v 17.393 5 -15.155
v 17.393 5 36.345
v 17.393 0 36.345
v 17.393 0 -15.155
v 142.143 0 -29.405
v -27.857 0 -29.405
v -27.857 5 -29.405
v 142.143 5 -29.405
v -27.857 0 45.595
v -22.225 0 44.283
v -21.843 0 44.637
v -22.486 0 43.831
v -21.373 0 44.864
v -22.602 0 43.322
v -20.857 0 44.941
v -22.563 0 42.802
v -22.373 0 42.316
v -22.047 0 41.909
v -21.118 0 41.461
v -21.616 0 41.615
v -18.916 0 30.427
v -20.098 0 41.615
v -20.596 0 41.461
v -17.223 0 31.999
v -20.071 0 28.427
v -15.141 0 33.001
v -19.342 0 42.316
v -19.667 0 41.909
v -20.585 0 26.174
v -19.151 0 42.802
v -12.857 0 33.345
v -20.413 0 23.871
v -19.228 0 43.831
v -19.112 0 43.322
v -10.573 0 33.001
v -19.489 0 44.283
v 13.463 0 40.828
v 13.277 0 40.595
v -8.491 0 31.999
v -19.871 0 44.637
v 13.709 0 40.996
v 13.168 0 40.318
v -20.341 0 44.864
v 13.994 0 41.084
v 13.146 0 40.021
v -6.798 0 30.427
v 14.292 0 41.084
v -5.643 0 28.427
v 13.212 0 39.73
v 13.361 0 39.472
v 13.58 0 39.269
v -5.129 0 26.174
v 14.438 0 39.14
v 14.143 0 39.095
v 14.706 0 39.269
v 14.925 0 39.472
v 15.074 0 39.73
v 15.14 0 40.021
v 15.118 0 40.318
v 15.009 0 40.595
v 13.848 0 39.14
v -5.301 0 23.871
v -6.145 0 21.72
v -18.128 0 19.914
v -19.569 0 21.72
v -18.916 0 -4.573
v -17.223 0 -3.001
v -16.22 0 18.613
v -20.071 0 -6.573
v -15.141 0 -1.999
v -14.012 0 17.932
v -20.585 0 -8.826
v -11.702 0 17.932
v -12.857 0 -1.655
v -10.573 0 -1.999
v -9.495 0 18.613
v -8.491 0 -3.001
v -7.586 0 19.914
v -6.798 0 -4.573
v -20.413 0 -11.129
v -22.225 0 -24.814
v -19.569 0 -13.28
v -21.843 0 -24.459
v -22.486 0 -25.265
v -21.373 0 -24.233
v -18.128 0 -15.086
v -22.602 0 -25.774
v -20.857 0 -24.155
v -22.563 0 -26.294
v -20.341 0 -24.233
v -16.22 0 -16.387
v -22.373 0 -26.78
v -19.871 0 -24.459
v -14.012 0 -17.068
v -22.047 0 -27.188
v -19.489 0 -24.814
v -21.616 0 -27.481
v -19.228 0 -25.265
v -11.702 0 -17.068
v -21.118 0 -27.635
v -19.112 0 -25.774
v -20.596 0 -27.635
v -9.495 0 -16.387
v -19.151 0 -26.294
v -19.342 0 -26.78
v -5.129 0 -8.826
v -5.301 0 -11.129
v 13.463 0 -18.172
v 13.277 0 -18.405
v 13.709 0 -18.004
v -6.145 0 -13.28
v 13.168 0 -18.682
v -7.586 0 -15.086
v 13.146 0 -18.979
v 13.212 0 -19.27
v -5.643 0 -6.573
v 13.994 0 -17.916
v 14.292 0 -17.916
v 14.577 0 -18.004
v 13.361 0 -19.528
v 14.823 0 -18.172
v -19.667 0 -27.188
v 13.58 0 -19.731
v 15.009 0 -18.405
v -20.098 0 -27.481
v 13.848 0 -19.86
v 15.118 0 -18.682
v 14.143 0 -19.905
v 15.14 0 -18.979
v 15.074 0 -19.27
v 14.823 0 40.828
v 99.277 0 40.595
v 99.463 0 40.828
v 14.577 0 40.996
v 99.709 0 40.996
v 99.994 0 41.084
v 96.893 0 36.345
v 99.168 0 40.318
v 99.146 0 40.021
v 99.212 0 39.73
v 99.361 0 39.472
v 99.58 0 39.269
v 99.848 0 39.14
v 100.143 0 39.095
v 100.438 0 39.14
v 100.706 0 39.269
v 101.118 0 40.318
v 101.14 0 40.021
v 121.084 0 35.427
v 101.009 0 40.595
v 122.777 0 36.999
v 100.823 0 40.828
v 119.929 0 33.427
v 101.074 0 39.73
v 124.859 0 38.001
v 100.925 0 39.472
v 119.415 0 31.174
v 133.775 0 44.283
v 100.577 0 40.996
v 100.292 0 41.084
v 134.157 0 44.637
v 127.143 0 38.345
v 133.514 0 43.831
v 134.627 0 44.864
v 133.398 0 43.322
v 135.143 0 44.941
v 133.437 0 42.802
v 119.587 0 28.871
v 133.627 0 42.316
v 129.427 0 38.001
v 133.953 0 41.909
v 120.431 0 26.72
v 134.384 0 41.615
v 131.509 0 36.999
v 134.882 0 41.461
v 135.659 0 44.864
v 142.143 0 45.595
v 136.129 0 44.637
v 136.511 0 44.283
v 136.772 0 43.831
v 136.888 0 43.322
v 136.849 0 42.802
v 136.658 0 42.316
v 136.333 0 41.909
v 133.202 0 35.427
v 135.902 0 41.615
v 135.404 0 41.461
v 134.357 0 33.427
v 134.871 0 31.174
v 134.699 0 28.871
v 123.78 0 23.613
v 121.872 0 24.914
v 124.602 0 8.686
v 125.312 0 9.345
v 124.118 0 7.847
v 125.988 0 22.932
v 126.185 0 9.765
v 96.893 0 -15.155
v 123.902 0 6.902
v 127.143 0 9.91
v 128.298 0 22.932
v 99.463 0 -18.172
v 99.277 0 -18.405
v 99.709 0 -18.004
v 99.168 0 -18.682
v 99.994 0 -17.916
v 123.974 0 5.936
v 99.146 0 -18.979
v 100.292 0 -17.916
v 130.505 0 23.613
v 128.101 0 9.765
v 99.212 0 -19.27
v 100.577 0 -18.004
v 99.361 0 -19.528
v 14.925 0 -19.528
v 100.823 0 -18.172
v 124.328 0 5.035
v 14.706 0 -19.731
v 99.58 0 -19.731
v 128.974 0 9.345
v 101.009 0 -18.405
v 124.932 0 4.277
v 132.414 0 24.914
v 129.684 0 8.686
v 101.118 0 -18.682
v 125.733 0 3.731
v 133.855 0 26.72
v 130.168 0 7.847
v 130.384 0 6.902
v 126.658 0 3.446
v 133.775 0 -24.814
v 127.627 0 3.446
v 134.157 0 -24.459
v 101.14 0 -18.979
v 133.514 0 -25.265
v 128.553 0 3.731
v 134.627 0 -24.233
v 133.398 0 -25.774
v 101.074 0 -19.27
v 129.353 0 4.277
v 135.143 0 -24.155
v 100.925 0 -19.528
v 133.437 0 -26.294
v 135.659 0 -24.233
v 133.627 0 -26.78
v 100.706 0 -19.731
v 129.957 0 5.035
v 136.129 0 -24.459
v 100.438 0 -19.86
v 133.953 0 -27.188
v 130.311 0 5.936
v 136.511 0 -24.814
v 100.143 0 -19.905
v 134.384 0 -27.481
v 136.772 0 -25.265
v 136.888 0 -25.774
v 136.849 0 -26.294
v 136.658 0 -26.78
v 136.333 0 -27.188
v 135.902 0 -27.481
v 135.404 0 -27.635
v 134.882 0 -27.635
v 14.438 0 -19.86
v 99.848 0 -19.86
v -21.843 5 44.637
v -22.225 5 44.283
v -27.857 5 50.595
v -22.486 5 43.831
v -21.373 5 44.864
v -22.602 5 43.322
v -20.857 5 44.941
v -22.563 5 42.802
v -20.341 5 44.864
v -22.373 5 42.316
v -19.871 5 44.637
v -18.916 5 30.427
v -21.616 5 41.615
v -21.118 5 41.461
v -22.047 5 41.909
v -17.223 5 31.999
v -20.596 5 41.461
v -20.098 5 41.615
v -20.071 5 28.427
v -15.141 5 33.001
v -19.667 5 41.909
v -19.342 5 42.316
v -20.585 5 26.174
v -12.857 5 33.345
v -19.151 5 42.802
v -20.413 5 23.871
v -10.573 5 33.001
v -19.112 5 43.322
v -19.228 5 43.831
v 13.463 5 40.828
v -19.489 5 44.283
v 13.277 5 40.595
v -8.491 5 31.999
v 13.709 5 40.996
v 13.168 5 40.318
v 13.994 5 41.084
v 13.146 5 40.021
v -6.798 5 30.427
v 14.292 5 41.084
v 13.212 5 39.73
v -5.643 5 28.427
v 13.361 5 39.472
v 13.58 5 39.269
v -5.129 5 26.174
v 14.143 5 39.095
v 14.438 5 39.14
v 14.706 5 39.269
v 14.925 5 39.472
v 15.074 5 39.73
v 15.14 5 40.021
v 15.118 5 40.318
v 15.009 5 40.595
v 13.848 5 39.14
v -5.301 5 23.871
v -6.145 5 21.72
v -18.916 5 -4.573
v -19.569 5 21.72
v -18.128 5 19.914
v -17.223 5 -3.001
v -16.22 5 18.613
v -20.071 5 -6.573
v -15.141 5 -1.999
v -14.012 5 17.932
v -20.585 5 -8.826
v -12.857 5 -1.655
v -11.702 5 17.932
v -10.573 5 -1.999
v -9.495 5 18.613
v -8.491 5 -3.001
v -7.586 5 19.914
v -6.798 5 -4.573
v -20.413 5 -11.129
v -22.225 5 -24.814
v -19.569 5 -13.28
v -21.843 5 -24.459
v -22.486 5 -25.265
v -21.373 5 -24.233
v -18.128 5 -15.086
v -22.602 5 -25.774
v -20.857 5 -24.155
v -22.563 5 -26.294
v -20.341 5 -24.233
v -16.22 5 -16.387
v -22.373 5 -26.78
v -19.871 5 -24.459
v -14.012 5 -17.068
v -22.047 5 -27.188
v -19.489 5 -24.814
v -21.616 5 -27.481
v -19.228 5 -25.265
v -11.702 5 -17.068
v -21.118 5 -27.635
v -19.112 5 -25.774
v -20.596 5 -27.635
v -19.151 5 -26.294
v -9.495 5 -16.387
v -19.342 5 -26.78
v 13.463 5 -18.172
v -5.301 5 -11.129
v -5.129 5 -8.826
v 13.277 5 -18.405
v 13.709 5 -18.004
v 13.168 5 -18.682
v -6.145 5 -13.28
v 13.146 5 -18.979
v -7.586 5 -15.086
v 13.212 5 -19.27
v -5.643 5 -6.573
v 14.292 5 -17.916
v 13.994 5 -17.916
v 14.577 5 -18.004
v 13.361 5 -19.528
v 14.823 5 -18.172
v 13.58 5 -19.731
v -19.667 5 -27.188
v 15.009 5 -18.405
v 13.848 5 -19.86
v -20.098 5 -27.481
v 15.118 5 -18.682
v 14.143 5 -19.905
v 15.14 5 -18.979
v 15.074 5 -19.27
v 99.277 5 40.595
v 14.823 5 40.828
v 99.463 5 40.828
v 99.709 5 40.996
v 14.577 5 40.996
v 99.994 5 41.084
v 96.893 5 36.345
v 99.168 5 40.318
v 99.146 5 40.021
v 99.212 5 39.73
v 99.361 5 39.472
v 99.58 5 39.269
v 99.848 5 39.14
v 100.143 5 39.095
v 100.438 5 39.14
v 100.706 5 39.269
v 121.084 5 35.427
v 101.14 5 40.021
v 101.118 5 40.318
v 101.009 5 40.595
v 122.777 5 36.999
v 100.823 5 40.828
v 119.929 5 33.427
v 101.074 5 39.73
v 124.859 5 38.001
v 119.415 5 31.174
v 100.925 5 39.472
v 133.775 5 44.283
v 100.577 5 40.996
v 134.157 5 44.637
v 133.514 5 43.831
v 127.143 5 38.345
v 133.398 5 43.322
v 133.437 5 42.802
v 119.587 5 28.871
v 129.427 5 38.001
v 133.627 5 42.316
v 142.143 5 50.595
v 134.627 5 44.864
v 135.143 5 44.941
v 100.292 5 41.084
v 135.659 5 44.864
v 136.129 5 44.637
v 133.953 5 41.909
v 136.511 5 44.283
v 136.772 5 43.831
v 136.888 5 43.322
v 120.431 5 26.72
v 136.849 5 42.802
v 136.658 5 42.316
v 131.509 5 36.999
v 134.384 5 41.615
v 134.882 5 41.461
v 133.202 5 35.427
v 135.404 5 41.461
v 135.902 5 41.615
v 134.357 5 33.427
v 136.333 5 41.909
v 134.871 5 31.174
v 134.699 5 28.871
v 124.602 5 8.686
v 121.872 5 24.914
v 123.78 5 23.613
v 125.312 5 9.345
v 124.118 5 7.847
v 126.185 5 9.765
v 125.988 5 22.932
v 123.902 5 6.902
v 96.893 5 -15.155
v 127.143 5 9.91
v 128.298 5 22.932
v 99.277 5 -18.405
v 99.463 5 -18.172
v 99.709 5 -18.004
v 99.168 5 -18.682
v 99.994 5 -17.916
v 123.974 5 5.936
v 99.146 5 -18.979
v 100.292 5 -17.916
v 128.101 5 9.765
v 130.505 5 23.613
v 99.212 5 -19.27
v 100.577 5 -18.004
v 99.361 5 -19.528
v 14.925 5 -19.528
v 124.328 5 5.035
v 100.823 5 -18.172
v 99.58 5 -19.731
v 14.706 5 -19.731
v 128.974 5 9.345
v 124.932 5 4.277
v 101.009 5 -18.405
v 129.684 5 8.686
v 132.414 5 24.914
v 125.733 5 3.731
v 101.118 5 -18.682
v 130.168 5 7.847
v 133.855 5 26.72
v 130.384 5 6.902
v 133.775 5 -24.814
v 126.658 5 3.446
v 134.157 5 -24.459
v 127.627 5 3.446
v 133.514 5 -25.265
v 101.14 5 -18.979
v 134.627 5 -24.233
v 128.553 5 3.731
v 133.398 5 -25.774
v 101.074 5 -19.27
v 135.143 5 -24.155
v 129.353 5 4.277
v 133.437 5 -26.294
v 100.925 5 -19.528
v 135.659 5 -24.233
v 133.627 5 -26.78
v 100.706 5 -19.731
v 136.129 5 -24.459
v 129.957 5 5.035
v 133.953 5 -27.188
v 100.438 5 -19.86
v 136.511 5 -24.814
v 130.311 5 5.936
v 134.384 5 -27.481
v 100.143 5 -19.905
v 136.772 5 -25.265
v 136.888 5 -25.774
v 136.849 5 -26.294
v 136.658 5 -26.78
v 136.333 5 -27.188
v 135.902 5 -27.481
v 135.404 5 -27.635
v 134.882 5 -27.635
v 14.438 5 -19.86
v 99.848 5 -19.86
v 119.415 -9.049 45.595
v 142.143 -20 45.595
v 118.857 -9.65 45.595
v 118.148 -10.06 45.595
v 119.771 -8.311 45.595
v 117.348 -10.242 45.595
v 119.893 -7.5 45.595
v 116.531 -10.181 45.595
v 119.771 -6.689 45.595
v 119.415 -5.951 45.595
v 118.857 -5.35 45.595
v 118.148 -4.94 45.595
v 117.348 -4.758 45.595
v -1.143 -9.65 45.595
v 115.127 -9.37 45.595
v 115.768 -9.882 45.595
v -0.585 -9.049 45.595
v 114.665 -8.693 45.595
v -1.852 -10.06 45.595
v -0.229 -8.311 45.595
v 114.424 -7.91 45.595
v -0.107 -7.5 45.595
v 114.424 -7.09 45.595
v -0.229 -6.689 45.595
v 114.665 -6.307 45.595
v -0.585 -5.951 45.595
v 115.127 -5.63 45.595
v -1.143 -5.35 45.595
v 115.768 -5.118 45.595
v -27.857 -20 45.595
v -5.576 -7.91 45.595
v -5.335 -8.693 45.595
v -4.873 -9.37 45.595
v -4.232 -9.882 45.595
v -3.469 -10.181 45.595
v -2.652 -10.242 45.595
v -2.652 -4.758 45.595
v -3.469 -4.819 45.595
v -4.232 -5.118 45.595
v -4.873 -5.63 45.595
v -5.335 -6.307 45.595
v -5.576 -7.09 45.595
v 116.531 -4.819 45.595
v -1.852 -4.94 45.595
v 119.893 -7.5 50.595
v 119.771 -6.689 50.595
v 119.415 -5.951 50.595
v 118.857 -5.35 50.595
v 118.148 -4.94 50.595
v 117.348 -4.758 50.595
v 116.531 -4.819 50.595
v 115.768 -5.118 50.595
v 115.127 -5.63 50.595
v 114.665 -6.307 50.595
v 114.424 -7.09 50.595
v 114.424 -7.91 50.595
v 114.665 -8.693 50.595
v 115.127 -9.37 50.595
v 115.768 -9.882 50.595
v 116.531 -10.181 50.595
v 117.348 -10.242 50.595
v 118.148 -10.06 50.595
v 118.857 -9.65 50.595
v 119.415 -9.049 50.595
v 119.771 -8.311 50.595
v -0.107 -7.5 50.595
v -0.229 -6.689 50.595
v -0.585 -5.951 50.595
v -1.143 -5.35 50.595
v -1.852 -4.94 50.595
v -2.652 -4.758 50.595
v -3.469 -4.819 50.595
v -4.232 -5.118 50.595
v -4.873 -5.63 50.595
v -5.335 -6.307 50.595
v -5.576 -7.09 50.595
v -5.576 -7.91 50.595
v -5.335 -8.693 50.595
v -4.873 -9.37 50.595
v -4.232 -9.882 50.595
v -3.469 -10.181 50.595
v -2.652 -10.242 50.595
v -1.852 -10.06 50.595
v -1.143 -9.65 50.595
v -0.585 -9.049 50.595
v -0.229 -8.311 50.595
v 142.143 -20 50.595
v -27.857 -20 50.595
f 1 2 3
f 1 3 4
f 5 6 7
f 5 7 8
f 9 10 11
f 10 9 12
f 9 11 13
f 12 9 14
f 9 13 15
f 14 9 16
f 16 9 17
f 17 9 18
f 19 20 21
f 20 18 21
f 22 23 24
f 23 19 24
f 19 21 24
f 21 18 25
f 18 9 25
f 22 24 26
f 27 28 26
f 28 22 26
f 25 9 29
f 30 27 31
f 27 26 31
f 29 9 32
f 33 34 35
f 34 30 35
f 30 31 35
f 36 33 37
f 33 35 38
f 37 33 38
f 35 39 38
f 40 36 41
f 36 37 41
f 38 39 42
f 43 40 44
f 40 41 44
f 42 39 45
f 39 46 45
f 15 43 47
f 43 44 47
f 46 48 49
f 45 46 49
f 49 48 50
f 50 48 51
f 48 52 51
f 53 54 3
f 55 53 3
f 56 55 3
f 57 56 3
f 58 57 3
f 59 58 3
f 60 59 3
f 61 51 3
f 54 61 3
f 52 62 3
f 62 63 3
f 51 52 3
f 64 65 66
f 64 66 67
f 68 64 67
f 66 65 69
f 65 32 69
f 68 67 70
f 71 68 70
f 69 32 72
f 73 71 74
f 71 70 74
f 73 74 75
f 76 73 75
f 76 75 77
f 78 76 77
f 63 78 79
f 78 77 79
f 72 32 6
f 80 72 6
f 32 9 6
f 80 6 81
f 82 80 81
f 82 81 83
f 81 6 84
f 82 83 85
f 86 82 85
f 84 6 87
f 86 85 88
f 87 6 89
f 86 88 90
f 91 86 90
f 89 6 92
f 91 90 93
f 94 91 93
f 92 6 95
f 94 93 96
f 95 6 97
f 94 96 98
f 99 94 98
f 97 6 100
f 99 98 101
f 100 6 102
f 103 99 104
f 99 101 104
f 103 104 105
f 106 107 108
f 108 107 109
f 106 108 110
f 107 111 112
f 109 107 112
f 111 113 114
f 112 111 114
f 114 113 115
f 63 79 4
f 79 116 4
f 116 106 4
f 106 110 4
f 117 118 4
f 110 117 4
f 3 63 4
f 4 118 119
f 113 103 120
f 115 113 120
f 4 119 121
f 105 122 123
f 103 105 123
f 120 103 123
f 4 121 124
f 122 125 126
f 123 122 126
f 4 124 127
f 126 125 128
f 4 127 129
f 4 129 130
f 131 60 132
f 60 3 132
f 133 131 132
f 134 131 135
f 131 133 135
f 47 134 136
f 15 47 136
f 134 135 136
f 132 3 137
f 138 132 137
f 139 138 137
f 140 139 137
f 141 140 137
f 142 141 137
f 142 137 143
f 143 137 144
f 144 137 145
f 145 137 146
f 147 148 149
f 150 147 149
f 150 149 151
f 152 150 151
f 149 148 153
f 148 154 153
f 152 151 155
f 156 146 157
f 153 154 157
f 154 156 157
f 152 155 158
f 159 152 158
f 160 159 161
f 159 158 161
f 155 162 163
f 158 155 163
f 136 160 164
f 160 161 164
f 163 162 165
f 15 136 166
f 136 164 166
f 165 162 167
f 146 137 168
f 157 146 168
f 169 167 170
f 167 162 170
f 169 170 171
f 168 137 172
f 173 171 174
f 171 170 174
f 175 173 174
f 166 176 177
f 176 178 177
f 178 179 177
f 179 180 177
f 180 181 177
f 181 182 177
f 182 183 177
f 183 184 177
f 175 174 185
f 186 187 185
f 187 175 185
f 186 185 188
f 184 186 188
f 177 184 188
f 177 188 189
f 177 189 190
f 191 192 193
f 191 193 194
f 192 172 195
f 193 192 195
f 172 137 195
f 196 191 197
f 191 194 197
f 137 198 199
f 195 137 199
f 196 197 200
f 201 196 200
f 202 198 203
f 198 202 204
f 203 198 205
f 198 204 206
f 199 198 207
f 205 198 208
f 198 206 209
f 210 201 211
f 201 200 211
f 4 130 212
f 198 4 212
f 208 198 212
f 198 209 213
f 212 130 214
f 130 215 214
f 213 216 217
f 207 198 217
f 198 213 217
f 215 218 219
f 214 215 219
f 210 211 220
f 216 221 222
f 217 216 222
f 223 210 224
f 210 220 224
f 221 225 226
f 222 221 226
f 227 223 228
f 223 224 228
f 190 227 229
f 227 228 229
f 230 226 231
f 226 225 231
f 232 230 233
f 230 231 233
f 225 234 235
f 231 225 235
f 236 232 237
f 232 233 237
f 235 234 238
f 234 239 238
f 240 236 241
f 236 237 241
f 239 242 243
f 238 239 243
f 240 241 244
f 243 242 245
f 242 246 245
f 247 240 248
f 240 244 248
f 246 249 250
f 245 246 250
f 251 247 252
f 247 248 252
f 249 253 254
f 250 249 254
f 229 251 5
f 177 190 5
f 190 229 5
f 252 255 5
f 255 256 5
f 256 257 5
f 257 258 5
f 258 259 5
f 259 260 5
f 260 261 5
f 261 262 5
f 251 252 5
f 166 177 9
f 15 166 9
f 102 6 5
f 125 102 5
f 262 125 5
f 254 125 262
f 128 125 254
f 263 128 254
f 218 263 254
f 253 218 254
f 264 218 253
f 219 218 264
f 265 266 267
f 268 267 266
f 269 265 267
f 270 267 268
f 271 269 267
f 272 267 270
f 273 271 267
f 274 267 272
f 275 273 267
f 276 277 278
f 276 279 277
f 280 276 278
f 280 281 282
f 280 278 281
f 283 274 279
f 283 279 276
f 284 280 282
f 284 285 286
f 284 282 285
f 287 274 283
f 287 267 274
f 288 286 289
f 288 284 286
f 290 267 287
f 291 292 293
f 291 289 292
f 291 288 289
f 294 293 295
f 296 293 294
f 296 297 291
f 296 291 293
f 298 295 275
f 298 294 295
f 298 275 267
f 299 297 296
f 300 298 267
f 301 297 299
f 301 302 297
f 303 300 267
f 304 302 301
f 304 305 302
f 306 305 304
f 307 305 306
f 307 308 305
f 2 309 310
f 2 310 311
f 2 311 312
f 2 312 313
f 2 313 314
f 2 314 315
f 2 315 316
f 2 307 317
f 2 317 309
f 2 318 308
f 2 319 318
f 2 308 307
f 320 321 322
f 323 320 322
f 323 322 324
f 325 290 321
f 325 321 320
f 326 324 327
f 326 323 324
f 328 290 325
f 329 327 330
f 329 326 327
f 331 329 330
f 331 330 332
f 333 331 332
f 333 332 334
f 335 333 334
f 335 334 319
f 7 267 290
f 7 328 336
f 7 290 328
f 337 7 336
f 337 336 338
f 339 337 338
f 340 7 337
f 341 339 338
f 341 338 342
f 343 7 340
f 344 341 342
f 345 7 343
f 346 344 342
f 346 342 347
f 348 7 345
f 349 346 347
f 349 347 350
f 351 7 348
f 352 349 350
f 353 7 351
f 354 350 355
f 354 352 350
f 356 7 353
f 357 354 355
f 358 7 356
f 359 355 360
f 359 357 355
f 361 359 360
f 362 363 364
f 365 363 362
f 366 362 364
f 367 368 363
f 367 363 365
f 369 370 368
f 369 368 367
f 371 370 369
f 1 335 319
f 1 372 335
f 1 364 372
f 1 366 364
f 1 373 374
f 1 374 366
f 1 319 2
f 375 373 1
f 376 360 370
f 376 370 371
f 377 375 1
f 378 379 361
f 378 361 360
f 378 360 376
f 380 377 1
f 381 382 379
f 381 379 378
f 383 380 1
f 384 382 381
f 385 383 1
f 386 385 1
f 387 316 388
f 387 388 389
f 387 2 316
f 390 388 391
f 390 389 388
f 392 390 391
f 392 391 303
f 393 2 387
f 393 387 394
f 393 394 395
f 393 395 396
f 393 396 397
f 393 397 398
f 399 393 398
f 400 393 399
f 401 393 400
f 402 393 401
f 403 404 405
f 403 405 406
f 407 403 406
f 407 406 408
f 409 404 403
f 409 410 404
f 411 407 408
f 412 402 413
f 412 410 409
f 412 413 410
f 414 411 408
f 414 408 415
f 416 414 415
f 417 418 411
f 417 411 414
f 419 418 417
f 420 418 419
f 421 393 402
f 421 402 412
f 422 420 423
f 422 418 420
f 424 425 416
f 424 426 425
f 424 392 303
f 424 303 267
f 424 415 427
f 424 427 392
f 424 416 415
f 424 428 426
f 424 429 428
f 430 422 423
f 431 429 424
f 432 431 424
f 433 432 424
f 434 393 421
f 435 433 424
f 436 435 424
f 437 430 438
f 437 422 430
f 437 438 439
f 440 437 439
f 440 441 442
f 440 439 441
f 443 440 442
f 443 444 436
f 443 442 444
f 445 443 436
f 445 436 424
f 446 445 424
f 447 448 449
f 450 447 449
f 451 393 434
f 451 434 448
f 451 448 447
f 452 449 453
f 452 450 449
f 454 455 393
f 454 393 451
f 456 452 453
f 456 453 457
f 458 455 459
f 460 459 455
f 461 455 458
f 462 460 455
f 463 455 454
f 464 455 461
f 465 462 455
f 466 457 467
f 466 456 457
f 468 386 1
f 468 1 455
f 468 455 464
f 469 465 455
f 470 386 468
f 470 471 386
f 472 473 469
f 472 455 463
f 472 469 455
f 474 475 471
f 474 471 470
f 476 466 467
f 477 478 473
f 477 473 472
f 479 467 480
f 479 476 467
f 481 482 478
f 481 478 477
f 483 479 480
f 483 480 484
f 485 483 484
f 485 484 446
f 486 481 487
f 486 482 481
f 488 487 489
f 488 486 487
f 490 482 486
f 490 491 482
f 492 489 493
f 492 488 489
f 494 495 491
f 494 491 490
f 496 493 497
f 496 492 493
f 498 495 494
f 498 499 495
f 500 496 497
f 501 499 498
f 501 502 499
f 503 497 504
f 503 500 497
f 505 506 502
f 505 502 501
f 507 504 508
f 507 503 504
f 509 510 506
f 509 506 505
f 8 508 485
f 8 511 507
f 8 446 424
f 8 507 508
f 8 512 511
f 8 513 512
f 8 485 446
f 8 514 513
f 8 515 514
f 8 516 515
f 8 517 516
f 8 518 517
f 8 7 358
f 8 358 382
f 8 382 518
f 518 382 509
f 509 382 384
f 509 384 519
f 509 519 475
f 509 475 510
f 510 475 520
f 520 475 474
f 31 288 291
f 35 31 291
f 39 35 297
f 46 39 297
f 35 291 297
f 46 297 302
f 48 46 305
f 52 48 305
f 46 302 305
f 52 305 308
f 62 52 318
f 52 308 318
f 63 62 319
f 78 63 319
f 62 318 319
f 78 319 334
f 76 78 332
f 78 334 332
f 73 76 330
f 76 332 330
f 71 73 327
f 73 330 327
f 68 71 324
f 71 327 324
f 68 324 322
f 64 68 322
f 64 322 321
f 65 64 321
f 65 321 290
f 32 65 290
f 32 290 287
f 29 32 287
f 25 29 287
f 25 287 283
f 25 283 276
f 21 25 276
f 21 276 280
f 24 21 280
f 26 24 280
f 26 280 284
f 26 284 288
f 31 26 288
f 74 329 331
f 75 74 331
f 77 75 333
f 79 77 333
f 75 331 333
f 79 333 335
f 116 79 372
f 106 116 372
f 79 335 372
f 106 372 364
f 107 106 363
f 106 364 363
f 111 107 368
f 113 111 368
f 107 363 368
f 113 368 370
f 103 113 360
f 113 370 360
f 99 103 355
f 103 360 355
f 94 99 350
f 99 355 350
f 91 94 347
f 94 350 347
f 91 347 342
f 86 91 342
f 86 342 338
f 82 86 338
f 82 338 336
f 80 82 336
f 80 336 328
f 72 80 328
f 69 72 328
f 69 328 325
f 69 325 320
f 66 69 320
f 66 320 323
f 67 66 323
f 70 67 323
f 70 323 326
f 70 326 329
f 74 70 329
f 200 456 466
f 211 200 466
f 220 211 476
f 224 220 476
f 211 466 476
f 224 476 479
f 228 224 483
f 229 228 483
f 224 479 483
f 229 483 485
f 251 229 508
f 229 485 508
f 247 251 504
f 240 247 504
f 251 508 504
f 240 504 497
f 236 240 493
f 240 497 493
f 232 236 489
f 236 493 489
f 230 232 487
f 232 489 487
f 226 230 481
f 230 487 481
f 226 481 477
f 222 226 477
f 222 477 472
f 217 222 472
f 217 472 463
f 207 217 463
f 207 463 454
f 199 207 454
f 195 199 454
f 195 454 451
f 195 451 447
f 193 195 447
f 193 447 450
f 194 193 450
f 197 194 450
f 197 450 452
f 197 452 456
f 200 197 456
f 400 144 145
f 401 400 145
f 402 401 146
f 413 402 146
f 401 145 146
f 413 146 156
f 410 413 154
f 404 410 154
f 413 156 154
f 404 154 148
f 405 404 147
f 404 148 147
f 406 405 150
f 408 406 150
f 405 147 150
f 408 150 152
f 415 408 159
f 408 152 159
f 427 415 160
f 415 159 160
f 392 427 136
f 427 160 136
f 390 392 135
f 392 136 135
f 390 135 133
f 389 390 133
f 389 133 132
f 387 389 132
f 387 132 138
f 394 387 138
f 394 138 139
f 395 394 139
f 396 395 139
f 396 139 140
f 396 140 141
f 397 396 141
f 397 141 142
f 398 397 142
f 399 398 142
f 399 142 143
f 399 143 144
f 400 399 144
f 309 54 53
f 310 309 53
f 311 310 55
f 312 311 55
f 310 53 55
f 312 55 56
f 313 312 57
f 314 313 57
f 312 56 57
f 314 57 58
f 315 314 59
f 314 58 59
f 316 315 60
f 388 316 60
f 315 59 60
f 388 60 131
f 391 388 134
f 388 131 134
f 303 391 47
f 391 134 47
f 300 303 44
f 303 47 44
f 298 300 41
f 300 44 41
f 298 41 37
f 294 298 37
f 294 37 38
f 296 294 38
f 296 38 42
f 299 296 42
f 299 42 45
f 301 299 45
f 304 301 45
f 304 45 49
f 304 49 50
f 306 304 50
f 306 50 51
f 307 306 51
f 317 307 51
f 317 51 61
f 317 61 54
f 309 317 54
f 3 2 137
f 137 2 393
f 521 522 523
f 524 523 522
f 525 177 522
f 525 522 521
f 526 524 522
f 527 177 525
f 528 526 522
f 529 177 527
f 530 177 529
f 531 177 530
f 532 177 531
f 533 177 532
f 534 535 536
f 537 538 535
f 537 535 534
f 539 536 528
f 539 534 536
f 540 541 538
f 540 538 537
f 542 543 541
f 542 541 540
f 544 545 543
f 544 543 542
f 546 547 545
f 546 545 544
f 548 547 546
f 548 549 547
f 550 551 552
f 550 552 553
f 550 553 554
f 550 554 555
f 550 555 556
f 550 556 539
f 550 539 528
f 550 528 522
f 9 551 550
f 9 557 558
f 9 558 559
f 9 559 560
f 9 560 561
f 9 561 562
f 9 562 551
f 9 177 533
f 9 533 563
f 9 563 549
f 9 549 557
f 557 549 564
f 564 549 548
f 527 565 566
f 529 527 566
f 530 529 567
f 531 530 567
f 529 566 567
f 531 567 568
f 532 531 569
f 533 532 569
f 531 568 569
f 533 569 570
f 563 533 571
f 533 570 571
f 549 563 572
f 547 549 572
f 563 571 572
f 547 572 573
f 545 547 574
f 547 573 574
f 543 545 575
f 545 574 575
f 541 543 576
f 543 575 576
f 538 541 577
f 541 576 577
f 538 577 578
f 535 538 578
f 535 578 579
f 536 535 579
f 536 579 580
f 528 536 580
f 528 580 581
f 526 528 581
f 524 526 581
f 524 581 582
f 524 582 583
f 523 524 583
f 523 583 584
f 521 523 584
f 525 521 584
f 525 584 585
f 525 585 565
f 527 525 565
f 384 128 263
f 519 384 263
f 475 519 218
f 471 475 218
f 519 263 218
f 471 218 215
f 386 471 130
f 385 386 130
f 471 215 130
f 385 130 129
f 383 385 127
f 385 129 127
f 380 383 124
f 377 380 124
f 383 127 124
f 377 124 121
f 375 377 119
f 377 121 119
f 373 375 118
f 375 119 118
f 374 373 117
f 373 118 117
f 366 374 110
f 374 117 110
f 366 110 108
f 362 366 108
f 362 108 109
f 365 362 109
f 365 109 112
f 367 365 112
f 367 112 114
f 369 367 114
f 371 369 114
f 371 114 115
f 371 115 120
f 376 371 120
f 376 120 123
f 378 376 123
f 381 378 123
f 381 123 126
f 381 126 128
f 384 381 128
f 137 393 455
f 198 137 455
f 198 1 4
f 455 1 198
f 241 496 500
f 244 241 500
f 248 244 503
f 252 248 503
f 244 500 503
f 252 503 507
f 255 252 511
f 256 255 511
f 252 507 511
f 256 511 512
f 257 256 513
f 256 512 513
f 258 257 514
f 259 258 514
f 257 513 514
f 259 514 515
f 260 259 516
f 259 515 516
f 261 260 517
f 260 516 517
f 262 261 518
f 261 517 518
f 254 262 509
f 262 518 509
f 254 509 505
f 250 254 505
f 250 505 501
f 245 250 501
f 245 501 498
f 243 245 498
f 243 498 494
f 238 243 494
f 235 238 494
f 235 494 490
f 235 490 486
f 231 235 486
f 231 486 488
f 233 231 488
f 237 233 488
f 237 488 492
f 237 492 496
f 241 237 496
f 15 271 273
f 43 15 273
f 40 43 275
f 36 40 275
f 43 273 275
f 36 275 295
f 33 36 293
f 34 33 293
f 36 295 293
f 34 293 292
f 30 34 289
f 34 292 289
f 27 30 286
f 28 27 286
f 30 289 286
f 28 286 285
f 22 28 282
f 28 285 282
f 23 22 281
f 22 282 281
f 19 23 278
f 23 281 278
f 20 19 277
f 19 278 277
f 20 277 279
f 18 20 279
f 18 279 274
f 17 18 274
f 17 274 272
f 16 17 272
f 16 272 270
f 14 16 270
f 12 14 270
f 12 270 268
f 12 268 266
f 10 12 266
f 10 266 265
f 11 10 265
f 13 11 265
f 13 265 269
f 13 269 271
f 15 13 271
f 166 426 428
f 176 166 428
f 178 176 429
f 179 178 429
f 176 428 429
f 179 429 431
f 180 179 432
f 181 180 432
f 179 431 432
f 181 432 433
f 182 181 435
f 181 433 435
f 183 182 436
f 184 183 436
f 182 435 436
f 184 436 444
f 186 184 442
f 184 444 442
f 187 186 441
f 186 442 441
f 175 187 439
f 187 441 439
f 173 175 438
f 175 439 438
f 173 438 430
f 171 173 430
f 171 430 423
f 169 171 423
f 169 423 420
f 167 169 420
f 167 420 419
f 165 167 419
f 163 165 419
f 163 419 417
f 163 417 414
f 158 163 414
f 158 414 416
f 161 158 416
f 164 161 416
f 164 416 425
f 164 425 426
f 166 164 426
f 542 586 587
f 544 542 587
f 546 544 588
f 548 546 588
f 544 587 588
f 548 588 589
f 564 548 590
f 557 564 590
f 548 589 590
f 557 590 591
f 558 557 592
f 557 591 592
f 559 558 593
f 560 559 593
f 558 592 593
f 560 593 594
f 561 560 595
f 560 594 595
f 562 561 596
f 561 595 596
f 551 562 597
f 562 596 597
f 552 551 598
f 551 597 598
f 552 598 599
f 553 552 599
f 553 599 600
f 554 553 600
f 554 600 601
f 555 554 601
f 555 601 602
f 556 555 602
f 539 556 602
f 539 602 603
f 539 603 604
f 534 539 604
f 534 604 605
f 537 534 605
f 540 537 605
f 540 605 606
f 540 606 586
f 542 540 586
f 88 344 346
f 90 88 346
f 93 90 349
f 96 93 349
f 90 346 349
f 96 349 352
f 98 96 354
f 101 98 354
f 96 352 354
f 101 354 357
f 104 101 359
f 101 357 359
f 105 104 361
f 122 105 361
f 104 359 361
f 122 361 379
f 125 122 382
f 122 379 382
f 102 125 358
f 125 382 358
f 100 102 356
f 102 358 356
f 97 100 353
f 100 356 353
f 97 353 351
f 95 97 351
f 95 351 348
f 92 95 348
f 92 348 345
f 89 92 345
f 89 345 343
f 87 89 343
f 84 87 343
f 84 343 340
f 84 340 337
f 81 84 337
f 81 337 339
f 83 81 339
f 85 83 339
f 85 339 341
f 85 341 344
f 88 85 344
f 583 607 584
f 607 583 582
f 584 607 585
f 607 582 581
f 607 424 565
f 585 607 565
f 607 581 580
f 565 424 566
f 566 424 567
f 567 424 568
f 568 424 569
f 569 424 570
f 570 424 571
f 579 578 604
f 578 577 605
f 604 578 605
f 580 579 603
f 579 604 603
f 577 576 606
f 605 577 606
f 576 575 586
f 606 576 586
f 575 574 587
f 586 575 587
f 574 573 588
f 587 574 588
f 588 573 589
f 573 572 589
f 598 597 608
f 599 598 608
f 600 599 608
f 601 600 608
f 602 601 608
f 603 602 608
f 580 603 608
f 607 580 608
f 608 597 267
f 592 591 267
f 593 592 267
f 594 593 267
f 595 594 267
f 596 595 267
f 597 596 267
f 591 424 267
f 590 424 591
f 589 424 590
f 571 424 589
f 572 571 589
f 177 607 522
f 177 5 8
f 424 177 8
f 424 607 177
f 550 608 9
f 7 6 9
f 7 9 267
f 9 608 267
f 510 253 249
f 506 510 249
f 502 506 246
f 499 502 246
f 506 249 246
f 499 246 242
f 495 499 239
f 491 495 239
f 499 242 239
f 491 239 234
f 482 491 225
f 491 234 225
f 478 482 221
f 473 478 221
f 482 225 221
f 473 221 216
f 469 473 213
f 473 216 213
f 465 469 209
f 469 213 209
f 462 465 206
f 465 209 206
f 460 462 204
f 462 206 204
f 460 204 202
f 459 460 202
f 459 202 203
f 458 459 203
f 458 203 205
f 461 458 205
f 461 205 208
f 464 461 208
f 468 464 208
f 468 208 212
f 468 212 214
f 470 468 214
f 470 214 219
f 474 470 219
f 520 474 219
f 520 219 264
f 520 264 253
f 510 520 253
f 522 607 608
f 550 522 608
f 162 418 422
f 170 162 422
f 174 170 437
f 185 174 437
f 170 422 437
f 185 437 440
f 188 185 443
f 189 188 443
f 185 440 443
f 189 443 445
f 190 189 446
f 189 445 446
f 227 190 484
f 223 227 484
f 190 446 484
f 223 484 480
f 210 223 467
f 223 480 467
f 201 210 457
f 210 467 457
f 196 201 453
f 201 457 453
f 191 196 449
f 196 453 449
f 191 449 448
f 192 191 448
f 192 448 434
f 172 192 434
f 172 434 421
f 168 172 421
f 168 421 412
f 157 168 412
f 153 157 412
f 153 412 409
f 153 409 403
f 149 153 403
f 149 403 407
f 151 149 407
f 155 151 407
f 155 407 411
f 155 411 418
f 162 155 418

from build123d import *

# Parameters (mm, degrees)
SKETCH_1_W          = 170
SKETCH_1_H          = 80
EXTRUDE_1_DEPTH     = 5
SKETCH_2_R          = 7.75
SKETCH_2_R_2        = 3.25
SKETCH_2_W          = 79.5
SKETCH_2_H          = 51.5
CUT_EXTRUDE_1_DEPTH = 151.961816214
SKETCH_5_W          = 170
SKETCH_5_H          = 25
EXTRUDE_3_DEPTH     = 5
SKETCH_7_R          = 2.75
CUT_EXTRUDE_4_DEPTH = 165.330739172
SKETCH_9_R          = 1
CUT_EXTRUDE_5_DEPTH = 153.19878434
SKETCH_10_R         = 1.75
CUT_EXTRUDE_6_DEPTH = 153.936163005


with BuildPart() as part:
    # 草图1 → 凸台-拉伸1 (new body)
    with BuildSketch(Plane(origin=(0, 0, 0), x_dir=(1, 0, 0), z_dir=(0, 1, 0))):
        with Locations((57.142857143, -10.595238095)):
            Rectangle(SKETCH_1_W, SKETCH_1_H)
    extrude(amount=EXTRUDE_1_DEPTH)

    # 草图2 → 切除-拉伸1 (cut, through all)
    with BuildSketch(Plane(origin=(0, 5, 0), x_dir=(1, 0, 0), z_dir=(0, 1, 0))):
        with Locations(Location((-12.857142857, 9.404761905, 0), (0, 0, 270))):
            Circle(SKETCH_2_R)
        with Locations(Location((-12.857142857, -25.595238095, 0), (0, 0, 270))):
            Circle(SKETCH_2_R)
        with Locations(Location((127.142857143, -6.659623692, 0), (0, 0, 270))):
            Circle(SKETCH_2_R_2)
        with Locations(Location((127.142857143, -30.595238095, 0), (0, 0, 270))):
            Circle(SKETCH_2_R)
        with Locations((57.142857143, -10.595238095)):
            Rectangle(SKETCH_2_W, SKETCH_2_H)
    extrude(amount=-CUT_EXTRUDE_1_DEPTH, mode=Mode.SUBTRACT)

    # 草图5 → 凸台-拉伸3 (add)
    with BuildSketch(Plane(origin=(0, 0, 50.595238095), x_dir=(-1, 0, 0), z_dir=(0, 0, -1))):
        with Locations((-57.142857143, -7.5)):
            Rectangle(SKETCH_5_W, SKETCH_5_H)
    extrude(amount=EXTRUDE_3_DEPTH)

    # 草图7 → 切除-拉伸4 (cut, through all)
    with BuildSketch(Plane.XY.offset(50.595238095)):
        with Locations((-2.857142857, -7.5)):
            Circle(SKETCH_7_R)
        with Locations((117.142857143, -7.5)):
            Circle(SKETCH_7_R)
    extrude(amount=-CUT_EXTRUDE_4_DEPTH, mode=Mode.SUBTRACT)

    # 草图9 → 切除-拉伸5 (cut, through all)
    with BuildSketch(Plane.XZ):
        with Locations(Location((14.142857143, -18.904761905, 0), (0, 0, 270))):
            Circle(SKETCH_9_R)
        with Locations(Location((100.142857143, -18.904761905, 0), (0, 0, 270))):
            Circle(SKETCH_9_R)
        with Locations(Location((100.142857143, 40.095238095, 0), (0, 0, 270))):
            Circle(SKETCH_9_R)
        with Locations(Location((14.142857143, 40.095238095, 0), (0, 0, 270))):
            Circle(SKETCH_9_R)
    extrude(amount=-CUT_EXTRUDE_5_DEPTH, mode=Mode.SUBTRACT)

    # 草图10 → 切除-拉伸6 (cut, through all)
    with BuildSketch(Plane(origin=(0, 5, 0), x_dir=(1, 0, 0), z_dir=(0, 1, 0))):
        with Locations(Location((-20.857142857, 25.904761905, 0), (0, 0, 270))):
            Circle(SKETCH_10_R)
        with Locations(Location((-20.857142857, -43.191421848, 0), (0, 0, 270))):
            Circle(SKETCH_10_R)
        with Locations(Location((135.142857143, -43.191421848, 0), (0, 0, 270))):
            Circle(SKETCH_10_R)
        with Locations(Location((135.142857143, 25.904761905, 0), (0, 0, 270))):
            Circle(SKETCH_10_R)
    extrude(amount=-CUT_EXTRUDE_6_DEPTH, mode=Mode.SUBTRACT)


solid = part.part
